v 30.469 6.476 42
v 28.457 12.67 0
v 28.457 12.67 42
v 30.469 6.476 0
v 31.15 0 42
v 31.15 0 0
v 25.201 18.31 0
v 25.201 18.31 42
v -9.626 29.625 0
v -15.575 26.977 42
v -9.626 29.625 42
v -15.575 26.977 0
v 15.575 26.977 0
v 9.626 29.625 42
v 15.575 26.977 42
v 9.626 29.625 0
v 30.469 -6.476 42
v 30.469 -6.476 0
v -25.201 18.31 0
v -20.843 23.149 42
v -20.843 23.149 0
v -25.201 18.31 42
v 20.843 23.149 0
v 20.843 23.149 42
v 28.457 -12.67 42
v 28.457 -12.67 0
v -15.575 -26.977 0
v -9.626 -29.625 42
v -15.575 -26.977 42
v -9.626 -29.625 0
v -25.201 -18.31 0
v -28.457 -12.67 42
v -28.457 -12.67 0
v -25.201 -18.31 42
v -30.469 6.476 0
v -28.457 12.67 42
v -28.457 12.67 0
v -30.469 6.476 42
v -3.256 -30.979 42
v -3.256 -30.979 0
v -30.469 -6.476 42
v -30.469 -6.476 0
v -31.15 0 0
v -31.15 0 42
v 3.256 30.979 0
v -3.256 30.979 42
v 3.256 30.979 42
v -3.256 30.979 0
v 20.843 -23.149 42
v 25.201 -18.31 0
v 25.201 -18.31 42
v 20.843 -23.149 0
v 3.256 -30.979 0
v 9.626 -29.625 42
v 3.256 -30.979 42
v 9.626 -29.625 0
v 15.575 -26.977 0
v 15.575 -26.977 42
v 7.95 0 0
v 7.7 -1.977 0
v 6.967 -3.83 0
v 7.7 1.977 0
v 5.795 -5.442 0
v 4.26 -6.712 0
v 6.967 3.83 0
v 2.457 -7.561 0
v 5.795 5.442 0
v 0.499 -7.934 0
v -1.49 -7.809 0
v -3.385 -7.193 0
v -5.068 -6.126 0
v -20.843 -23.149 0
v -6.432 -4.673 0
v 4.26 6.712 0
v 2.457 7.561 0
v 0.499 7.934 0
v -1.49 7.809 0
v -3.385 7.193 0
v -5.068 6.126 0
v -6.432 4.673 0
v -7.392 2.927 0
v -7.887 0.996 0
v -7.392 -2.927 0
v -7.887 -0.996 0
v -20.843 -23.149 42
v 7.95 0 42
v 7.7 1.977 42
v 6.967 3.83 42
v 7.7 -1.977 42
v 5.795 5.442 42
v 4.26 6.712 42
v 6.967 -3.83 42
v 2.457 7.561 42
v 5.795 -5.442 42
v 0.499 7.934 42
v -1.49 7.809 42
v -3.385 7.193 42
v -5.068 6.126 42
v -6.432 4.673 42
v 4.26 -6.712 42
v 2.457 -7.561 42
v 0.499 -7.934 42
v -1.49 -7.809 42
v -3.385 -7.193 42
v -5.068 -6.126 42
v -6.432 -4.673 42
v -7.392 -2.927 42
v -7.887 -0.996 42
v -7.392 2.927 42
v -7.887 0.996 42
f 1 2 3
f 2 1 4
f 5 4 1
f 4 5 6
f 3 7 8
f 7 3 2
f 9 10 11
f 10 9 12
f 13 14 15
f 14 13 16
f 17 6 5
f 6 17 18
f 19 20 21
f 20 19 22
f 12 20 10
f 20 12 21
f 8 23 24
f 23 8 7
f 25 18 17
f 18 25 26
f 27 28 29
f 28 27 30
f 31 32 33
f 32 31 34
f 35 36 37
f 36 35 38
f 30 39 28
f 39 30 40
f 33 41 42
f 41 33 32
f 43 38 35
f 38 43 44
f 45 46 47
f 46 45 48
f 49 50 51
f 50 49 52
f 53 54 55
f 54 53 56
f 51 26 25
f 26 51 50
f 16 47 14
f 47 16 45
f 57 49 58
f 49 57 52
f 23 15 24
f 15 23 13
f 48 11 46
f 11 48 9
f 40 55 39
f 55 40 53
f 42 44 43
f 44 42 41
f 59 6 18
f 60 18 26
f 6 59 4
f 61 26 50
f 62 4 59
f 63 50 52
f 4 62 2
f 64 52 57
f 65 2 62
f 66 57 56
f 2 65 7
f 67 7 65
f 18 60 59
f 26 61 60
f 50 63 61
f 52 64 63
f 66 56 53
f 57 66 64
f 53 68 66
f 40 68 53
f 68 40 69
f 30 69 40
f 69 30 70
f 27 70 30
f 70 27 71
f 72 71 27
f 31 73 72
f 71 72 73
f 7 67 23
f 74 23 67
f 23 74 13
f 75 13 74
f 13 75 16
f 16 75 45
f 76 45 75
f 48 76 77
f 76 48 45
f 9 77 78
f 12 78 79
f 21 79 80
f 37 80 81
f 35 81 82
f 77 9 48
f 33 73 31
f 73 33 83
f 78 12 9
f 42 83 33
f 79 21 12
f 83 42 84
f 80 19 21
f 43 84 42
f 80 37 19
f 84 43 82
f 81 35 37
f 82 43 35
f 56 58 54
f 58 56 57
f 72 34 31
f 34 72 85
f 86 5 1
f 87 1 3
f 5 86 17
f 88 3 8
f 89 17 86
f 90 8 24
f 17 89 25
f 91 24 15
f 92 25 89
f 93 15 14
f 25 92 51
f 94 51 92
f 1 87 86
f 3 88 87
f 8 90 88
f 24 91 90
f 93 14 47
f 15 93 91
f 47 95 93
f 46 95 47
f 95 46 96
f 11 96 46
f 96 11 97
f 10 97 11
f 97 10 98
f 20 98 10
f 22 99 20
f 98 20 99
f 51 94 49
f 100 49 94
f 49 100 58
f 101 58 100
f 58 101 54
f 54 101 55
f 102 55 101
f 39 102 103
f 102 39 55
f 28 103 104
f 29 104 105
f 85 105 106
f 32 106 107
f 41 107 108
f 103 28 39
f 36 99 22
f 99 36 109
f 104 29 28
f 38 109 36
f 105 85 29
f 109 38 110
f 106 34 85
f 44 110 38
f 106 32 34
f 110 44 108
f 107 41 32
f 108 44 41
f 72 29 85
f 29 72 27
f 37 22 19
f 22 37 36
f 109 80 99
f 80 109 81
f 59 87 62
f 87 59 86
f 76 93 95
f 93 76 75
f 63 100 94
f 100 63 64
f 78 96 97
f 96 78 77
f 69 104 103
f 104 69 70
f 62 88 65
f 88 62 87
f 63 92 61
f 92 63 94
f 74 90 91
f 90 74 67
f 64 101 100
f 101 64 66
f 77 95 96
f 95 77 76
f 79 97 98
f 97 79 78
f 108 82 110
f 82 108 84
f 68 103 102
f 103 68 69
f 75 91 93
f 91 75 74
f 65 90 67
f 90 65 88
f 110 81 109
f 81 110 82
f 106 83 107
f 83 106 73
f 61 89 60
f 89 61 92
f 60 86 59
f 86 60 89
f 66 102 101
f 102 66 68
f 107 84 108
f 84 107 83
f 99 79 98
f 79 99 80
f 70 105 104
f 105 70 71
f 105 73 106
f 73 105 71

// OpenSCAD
difference() {
cylinder(d=62.3,42);
cylinder(d=15.9,100,center=true);
}


//OD 62.3,  15.9 ID,  42 H
//OD 61.7,    18 ID,  40 H ??
//OD 60  ,    15 ID,  40 H ??
